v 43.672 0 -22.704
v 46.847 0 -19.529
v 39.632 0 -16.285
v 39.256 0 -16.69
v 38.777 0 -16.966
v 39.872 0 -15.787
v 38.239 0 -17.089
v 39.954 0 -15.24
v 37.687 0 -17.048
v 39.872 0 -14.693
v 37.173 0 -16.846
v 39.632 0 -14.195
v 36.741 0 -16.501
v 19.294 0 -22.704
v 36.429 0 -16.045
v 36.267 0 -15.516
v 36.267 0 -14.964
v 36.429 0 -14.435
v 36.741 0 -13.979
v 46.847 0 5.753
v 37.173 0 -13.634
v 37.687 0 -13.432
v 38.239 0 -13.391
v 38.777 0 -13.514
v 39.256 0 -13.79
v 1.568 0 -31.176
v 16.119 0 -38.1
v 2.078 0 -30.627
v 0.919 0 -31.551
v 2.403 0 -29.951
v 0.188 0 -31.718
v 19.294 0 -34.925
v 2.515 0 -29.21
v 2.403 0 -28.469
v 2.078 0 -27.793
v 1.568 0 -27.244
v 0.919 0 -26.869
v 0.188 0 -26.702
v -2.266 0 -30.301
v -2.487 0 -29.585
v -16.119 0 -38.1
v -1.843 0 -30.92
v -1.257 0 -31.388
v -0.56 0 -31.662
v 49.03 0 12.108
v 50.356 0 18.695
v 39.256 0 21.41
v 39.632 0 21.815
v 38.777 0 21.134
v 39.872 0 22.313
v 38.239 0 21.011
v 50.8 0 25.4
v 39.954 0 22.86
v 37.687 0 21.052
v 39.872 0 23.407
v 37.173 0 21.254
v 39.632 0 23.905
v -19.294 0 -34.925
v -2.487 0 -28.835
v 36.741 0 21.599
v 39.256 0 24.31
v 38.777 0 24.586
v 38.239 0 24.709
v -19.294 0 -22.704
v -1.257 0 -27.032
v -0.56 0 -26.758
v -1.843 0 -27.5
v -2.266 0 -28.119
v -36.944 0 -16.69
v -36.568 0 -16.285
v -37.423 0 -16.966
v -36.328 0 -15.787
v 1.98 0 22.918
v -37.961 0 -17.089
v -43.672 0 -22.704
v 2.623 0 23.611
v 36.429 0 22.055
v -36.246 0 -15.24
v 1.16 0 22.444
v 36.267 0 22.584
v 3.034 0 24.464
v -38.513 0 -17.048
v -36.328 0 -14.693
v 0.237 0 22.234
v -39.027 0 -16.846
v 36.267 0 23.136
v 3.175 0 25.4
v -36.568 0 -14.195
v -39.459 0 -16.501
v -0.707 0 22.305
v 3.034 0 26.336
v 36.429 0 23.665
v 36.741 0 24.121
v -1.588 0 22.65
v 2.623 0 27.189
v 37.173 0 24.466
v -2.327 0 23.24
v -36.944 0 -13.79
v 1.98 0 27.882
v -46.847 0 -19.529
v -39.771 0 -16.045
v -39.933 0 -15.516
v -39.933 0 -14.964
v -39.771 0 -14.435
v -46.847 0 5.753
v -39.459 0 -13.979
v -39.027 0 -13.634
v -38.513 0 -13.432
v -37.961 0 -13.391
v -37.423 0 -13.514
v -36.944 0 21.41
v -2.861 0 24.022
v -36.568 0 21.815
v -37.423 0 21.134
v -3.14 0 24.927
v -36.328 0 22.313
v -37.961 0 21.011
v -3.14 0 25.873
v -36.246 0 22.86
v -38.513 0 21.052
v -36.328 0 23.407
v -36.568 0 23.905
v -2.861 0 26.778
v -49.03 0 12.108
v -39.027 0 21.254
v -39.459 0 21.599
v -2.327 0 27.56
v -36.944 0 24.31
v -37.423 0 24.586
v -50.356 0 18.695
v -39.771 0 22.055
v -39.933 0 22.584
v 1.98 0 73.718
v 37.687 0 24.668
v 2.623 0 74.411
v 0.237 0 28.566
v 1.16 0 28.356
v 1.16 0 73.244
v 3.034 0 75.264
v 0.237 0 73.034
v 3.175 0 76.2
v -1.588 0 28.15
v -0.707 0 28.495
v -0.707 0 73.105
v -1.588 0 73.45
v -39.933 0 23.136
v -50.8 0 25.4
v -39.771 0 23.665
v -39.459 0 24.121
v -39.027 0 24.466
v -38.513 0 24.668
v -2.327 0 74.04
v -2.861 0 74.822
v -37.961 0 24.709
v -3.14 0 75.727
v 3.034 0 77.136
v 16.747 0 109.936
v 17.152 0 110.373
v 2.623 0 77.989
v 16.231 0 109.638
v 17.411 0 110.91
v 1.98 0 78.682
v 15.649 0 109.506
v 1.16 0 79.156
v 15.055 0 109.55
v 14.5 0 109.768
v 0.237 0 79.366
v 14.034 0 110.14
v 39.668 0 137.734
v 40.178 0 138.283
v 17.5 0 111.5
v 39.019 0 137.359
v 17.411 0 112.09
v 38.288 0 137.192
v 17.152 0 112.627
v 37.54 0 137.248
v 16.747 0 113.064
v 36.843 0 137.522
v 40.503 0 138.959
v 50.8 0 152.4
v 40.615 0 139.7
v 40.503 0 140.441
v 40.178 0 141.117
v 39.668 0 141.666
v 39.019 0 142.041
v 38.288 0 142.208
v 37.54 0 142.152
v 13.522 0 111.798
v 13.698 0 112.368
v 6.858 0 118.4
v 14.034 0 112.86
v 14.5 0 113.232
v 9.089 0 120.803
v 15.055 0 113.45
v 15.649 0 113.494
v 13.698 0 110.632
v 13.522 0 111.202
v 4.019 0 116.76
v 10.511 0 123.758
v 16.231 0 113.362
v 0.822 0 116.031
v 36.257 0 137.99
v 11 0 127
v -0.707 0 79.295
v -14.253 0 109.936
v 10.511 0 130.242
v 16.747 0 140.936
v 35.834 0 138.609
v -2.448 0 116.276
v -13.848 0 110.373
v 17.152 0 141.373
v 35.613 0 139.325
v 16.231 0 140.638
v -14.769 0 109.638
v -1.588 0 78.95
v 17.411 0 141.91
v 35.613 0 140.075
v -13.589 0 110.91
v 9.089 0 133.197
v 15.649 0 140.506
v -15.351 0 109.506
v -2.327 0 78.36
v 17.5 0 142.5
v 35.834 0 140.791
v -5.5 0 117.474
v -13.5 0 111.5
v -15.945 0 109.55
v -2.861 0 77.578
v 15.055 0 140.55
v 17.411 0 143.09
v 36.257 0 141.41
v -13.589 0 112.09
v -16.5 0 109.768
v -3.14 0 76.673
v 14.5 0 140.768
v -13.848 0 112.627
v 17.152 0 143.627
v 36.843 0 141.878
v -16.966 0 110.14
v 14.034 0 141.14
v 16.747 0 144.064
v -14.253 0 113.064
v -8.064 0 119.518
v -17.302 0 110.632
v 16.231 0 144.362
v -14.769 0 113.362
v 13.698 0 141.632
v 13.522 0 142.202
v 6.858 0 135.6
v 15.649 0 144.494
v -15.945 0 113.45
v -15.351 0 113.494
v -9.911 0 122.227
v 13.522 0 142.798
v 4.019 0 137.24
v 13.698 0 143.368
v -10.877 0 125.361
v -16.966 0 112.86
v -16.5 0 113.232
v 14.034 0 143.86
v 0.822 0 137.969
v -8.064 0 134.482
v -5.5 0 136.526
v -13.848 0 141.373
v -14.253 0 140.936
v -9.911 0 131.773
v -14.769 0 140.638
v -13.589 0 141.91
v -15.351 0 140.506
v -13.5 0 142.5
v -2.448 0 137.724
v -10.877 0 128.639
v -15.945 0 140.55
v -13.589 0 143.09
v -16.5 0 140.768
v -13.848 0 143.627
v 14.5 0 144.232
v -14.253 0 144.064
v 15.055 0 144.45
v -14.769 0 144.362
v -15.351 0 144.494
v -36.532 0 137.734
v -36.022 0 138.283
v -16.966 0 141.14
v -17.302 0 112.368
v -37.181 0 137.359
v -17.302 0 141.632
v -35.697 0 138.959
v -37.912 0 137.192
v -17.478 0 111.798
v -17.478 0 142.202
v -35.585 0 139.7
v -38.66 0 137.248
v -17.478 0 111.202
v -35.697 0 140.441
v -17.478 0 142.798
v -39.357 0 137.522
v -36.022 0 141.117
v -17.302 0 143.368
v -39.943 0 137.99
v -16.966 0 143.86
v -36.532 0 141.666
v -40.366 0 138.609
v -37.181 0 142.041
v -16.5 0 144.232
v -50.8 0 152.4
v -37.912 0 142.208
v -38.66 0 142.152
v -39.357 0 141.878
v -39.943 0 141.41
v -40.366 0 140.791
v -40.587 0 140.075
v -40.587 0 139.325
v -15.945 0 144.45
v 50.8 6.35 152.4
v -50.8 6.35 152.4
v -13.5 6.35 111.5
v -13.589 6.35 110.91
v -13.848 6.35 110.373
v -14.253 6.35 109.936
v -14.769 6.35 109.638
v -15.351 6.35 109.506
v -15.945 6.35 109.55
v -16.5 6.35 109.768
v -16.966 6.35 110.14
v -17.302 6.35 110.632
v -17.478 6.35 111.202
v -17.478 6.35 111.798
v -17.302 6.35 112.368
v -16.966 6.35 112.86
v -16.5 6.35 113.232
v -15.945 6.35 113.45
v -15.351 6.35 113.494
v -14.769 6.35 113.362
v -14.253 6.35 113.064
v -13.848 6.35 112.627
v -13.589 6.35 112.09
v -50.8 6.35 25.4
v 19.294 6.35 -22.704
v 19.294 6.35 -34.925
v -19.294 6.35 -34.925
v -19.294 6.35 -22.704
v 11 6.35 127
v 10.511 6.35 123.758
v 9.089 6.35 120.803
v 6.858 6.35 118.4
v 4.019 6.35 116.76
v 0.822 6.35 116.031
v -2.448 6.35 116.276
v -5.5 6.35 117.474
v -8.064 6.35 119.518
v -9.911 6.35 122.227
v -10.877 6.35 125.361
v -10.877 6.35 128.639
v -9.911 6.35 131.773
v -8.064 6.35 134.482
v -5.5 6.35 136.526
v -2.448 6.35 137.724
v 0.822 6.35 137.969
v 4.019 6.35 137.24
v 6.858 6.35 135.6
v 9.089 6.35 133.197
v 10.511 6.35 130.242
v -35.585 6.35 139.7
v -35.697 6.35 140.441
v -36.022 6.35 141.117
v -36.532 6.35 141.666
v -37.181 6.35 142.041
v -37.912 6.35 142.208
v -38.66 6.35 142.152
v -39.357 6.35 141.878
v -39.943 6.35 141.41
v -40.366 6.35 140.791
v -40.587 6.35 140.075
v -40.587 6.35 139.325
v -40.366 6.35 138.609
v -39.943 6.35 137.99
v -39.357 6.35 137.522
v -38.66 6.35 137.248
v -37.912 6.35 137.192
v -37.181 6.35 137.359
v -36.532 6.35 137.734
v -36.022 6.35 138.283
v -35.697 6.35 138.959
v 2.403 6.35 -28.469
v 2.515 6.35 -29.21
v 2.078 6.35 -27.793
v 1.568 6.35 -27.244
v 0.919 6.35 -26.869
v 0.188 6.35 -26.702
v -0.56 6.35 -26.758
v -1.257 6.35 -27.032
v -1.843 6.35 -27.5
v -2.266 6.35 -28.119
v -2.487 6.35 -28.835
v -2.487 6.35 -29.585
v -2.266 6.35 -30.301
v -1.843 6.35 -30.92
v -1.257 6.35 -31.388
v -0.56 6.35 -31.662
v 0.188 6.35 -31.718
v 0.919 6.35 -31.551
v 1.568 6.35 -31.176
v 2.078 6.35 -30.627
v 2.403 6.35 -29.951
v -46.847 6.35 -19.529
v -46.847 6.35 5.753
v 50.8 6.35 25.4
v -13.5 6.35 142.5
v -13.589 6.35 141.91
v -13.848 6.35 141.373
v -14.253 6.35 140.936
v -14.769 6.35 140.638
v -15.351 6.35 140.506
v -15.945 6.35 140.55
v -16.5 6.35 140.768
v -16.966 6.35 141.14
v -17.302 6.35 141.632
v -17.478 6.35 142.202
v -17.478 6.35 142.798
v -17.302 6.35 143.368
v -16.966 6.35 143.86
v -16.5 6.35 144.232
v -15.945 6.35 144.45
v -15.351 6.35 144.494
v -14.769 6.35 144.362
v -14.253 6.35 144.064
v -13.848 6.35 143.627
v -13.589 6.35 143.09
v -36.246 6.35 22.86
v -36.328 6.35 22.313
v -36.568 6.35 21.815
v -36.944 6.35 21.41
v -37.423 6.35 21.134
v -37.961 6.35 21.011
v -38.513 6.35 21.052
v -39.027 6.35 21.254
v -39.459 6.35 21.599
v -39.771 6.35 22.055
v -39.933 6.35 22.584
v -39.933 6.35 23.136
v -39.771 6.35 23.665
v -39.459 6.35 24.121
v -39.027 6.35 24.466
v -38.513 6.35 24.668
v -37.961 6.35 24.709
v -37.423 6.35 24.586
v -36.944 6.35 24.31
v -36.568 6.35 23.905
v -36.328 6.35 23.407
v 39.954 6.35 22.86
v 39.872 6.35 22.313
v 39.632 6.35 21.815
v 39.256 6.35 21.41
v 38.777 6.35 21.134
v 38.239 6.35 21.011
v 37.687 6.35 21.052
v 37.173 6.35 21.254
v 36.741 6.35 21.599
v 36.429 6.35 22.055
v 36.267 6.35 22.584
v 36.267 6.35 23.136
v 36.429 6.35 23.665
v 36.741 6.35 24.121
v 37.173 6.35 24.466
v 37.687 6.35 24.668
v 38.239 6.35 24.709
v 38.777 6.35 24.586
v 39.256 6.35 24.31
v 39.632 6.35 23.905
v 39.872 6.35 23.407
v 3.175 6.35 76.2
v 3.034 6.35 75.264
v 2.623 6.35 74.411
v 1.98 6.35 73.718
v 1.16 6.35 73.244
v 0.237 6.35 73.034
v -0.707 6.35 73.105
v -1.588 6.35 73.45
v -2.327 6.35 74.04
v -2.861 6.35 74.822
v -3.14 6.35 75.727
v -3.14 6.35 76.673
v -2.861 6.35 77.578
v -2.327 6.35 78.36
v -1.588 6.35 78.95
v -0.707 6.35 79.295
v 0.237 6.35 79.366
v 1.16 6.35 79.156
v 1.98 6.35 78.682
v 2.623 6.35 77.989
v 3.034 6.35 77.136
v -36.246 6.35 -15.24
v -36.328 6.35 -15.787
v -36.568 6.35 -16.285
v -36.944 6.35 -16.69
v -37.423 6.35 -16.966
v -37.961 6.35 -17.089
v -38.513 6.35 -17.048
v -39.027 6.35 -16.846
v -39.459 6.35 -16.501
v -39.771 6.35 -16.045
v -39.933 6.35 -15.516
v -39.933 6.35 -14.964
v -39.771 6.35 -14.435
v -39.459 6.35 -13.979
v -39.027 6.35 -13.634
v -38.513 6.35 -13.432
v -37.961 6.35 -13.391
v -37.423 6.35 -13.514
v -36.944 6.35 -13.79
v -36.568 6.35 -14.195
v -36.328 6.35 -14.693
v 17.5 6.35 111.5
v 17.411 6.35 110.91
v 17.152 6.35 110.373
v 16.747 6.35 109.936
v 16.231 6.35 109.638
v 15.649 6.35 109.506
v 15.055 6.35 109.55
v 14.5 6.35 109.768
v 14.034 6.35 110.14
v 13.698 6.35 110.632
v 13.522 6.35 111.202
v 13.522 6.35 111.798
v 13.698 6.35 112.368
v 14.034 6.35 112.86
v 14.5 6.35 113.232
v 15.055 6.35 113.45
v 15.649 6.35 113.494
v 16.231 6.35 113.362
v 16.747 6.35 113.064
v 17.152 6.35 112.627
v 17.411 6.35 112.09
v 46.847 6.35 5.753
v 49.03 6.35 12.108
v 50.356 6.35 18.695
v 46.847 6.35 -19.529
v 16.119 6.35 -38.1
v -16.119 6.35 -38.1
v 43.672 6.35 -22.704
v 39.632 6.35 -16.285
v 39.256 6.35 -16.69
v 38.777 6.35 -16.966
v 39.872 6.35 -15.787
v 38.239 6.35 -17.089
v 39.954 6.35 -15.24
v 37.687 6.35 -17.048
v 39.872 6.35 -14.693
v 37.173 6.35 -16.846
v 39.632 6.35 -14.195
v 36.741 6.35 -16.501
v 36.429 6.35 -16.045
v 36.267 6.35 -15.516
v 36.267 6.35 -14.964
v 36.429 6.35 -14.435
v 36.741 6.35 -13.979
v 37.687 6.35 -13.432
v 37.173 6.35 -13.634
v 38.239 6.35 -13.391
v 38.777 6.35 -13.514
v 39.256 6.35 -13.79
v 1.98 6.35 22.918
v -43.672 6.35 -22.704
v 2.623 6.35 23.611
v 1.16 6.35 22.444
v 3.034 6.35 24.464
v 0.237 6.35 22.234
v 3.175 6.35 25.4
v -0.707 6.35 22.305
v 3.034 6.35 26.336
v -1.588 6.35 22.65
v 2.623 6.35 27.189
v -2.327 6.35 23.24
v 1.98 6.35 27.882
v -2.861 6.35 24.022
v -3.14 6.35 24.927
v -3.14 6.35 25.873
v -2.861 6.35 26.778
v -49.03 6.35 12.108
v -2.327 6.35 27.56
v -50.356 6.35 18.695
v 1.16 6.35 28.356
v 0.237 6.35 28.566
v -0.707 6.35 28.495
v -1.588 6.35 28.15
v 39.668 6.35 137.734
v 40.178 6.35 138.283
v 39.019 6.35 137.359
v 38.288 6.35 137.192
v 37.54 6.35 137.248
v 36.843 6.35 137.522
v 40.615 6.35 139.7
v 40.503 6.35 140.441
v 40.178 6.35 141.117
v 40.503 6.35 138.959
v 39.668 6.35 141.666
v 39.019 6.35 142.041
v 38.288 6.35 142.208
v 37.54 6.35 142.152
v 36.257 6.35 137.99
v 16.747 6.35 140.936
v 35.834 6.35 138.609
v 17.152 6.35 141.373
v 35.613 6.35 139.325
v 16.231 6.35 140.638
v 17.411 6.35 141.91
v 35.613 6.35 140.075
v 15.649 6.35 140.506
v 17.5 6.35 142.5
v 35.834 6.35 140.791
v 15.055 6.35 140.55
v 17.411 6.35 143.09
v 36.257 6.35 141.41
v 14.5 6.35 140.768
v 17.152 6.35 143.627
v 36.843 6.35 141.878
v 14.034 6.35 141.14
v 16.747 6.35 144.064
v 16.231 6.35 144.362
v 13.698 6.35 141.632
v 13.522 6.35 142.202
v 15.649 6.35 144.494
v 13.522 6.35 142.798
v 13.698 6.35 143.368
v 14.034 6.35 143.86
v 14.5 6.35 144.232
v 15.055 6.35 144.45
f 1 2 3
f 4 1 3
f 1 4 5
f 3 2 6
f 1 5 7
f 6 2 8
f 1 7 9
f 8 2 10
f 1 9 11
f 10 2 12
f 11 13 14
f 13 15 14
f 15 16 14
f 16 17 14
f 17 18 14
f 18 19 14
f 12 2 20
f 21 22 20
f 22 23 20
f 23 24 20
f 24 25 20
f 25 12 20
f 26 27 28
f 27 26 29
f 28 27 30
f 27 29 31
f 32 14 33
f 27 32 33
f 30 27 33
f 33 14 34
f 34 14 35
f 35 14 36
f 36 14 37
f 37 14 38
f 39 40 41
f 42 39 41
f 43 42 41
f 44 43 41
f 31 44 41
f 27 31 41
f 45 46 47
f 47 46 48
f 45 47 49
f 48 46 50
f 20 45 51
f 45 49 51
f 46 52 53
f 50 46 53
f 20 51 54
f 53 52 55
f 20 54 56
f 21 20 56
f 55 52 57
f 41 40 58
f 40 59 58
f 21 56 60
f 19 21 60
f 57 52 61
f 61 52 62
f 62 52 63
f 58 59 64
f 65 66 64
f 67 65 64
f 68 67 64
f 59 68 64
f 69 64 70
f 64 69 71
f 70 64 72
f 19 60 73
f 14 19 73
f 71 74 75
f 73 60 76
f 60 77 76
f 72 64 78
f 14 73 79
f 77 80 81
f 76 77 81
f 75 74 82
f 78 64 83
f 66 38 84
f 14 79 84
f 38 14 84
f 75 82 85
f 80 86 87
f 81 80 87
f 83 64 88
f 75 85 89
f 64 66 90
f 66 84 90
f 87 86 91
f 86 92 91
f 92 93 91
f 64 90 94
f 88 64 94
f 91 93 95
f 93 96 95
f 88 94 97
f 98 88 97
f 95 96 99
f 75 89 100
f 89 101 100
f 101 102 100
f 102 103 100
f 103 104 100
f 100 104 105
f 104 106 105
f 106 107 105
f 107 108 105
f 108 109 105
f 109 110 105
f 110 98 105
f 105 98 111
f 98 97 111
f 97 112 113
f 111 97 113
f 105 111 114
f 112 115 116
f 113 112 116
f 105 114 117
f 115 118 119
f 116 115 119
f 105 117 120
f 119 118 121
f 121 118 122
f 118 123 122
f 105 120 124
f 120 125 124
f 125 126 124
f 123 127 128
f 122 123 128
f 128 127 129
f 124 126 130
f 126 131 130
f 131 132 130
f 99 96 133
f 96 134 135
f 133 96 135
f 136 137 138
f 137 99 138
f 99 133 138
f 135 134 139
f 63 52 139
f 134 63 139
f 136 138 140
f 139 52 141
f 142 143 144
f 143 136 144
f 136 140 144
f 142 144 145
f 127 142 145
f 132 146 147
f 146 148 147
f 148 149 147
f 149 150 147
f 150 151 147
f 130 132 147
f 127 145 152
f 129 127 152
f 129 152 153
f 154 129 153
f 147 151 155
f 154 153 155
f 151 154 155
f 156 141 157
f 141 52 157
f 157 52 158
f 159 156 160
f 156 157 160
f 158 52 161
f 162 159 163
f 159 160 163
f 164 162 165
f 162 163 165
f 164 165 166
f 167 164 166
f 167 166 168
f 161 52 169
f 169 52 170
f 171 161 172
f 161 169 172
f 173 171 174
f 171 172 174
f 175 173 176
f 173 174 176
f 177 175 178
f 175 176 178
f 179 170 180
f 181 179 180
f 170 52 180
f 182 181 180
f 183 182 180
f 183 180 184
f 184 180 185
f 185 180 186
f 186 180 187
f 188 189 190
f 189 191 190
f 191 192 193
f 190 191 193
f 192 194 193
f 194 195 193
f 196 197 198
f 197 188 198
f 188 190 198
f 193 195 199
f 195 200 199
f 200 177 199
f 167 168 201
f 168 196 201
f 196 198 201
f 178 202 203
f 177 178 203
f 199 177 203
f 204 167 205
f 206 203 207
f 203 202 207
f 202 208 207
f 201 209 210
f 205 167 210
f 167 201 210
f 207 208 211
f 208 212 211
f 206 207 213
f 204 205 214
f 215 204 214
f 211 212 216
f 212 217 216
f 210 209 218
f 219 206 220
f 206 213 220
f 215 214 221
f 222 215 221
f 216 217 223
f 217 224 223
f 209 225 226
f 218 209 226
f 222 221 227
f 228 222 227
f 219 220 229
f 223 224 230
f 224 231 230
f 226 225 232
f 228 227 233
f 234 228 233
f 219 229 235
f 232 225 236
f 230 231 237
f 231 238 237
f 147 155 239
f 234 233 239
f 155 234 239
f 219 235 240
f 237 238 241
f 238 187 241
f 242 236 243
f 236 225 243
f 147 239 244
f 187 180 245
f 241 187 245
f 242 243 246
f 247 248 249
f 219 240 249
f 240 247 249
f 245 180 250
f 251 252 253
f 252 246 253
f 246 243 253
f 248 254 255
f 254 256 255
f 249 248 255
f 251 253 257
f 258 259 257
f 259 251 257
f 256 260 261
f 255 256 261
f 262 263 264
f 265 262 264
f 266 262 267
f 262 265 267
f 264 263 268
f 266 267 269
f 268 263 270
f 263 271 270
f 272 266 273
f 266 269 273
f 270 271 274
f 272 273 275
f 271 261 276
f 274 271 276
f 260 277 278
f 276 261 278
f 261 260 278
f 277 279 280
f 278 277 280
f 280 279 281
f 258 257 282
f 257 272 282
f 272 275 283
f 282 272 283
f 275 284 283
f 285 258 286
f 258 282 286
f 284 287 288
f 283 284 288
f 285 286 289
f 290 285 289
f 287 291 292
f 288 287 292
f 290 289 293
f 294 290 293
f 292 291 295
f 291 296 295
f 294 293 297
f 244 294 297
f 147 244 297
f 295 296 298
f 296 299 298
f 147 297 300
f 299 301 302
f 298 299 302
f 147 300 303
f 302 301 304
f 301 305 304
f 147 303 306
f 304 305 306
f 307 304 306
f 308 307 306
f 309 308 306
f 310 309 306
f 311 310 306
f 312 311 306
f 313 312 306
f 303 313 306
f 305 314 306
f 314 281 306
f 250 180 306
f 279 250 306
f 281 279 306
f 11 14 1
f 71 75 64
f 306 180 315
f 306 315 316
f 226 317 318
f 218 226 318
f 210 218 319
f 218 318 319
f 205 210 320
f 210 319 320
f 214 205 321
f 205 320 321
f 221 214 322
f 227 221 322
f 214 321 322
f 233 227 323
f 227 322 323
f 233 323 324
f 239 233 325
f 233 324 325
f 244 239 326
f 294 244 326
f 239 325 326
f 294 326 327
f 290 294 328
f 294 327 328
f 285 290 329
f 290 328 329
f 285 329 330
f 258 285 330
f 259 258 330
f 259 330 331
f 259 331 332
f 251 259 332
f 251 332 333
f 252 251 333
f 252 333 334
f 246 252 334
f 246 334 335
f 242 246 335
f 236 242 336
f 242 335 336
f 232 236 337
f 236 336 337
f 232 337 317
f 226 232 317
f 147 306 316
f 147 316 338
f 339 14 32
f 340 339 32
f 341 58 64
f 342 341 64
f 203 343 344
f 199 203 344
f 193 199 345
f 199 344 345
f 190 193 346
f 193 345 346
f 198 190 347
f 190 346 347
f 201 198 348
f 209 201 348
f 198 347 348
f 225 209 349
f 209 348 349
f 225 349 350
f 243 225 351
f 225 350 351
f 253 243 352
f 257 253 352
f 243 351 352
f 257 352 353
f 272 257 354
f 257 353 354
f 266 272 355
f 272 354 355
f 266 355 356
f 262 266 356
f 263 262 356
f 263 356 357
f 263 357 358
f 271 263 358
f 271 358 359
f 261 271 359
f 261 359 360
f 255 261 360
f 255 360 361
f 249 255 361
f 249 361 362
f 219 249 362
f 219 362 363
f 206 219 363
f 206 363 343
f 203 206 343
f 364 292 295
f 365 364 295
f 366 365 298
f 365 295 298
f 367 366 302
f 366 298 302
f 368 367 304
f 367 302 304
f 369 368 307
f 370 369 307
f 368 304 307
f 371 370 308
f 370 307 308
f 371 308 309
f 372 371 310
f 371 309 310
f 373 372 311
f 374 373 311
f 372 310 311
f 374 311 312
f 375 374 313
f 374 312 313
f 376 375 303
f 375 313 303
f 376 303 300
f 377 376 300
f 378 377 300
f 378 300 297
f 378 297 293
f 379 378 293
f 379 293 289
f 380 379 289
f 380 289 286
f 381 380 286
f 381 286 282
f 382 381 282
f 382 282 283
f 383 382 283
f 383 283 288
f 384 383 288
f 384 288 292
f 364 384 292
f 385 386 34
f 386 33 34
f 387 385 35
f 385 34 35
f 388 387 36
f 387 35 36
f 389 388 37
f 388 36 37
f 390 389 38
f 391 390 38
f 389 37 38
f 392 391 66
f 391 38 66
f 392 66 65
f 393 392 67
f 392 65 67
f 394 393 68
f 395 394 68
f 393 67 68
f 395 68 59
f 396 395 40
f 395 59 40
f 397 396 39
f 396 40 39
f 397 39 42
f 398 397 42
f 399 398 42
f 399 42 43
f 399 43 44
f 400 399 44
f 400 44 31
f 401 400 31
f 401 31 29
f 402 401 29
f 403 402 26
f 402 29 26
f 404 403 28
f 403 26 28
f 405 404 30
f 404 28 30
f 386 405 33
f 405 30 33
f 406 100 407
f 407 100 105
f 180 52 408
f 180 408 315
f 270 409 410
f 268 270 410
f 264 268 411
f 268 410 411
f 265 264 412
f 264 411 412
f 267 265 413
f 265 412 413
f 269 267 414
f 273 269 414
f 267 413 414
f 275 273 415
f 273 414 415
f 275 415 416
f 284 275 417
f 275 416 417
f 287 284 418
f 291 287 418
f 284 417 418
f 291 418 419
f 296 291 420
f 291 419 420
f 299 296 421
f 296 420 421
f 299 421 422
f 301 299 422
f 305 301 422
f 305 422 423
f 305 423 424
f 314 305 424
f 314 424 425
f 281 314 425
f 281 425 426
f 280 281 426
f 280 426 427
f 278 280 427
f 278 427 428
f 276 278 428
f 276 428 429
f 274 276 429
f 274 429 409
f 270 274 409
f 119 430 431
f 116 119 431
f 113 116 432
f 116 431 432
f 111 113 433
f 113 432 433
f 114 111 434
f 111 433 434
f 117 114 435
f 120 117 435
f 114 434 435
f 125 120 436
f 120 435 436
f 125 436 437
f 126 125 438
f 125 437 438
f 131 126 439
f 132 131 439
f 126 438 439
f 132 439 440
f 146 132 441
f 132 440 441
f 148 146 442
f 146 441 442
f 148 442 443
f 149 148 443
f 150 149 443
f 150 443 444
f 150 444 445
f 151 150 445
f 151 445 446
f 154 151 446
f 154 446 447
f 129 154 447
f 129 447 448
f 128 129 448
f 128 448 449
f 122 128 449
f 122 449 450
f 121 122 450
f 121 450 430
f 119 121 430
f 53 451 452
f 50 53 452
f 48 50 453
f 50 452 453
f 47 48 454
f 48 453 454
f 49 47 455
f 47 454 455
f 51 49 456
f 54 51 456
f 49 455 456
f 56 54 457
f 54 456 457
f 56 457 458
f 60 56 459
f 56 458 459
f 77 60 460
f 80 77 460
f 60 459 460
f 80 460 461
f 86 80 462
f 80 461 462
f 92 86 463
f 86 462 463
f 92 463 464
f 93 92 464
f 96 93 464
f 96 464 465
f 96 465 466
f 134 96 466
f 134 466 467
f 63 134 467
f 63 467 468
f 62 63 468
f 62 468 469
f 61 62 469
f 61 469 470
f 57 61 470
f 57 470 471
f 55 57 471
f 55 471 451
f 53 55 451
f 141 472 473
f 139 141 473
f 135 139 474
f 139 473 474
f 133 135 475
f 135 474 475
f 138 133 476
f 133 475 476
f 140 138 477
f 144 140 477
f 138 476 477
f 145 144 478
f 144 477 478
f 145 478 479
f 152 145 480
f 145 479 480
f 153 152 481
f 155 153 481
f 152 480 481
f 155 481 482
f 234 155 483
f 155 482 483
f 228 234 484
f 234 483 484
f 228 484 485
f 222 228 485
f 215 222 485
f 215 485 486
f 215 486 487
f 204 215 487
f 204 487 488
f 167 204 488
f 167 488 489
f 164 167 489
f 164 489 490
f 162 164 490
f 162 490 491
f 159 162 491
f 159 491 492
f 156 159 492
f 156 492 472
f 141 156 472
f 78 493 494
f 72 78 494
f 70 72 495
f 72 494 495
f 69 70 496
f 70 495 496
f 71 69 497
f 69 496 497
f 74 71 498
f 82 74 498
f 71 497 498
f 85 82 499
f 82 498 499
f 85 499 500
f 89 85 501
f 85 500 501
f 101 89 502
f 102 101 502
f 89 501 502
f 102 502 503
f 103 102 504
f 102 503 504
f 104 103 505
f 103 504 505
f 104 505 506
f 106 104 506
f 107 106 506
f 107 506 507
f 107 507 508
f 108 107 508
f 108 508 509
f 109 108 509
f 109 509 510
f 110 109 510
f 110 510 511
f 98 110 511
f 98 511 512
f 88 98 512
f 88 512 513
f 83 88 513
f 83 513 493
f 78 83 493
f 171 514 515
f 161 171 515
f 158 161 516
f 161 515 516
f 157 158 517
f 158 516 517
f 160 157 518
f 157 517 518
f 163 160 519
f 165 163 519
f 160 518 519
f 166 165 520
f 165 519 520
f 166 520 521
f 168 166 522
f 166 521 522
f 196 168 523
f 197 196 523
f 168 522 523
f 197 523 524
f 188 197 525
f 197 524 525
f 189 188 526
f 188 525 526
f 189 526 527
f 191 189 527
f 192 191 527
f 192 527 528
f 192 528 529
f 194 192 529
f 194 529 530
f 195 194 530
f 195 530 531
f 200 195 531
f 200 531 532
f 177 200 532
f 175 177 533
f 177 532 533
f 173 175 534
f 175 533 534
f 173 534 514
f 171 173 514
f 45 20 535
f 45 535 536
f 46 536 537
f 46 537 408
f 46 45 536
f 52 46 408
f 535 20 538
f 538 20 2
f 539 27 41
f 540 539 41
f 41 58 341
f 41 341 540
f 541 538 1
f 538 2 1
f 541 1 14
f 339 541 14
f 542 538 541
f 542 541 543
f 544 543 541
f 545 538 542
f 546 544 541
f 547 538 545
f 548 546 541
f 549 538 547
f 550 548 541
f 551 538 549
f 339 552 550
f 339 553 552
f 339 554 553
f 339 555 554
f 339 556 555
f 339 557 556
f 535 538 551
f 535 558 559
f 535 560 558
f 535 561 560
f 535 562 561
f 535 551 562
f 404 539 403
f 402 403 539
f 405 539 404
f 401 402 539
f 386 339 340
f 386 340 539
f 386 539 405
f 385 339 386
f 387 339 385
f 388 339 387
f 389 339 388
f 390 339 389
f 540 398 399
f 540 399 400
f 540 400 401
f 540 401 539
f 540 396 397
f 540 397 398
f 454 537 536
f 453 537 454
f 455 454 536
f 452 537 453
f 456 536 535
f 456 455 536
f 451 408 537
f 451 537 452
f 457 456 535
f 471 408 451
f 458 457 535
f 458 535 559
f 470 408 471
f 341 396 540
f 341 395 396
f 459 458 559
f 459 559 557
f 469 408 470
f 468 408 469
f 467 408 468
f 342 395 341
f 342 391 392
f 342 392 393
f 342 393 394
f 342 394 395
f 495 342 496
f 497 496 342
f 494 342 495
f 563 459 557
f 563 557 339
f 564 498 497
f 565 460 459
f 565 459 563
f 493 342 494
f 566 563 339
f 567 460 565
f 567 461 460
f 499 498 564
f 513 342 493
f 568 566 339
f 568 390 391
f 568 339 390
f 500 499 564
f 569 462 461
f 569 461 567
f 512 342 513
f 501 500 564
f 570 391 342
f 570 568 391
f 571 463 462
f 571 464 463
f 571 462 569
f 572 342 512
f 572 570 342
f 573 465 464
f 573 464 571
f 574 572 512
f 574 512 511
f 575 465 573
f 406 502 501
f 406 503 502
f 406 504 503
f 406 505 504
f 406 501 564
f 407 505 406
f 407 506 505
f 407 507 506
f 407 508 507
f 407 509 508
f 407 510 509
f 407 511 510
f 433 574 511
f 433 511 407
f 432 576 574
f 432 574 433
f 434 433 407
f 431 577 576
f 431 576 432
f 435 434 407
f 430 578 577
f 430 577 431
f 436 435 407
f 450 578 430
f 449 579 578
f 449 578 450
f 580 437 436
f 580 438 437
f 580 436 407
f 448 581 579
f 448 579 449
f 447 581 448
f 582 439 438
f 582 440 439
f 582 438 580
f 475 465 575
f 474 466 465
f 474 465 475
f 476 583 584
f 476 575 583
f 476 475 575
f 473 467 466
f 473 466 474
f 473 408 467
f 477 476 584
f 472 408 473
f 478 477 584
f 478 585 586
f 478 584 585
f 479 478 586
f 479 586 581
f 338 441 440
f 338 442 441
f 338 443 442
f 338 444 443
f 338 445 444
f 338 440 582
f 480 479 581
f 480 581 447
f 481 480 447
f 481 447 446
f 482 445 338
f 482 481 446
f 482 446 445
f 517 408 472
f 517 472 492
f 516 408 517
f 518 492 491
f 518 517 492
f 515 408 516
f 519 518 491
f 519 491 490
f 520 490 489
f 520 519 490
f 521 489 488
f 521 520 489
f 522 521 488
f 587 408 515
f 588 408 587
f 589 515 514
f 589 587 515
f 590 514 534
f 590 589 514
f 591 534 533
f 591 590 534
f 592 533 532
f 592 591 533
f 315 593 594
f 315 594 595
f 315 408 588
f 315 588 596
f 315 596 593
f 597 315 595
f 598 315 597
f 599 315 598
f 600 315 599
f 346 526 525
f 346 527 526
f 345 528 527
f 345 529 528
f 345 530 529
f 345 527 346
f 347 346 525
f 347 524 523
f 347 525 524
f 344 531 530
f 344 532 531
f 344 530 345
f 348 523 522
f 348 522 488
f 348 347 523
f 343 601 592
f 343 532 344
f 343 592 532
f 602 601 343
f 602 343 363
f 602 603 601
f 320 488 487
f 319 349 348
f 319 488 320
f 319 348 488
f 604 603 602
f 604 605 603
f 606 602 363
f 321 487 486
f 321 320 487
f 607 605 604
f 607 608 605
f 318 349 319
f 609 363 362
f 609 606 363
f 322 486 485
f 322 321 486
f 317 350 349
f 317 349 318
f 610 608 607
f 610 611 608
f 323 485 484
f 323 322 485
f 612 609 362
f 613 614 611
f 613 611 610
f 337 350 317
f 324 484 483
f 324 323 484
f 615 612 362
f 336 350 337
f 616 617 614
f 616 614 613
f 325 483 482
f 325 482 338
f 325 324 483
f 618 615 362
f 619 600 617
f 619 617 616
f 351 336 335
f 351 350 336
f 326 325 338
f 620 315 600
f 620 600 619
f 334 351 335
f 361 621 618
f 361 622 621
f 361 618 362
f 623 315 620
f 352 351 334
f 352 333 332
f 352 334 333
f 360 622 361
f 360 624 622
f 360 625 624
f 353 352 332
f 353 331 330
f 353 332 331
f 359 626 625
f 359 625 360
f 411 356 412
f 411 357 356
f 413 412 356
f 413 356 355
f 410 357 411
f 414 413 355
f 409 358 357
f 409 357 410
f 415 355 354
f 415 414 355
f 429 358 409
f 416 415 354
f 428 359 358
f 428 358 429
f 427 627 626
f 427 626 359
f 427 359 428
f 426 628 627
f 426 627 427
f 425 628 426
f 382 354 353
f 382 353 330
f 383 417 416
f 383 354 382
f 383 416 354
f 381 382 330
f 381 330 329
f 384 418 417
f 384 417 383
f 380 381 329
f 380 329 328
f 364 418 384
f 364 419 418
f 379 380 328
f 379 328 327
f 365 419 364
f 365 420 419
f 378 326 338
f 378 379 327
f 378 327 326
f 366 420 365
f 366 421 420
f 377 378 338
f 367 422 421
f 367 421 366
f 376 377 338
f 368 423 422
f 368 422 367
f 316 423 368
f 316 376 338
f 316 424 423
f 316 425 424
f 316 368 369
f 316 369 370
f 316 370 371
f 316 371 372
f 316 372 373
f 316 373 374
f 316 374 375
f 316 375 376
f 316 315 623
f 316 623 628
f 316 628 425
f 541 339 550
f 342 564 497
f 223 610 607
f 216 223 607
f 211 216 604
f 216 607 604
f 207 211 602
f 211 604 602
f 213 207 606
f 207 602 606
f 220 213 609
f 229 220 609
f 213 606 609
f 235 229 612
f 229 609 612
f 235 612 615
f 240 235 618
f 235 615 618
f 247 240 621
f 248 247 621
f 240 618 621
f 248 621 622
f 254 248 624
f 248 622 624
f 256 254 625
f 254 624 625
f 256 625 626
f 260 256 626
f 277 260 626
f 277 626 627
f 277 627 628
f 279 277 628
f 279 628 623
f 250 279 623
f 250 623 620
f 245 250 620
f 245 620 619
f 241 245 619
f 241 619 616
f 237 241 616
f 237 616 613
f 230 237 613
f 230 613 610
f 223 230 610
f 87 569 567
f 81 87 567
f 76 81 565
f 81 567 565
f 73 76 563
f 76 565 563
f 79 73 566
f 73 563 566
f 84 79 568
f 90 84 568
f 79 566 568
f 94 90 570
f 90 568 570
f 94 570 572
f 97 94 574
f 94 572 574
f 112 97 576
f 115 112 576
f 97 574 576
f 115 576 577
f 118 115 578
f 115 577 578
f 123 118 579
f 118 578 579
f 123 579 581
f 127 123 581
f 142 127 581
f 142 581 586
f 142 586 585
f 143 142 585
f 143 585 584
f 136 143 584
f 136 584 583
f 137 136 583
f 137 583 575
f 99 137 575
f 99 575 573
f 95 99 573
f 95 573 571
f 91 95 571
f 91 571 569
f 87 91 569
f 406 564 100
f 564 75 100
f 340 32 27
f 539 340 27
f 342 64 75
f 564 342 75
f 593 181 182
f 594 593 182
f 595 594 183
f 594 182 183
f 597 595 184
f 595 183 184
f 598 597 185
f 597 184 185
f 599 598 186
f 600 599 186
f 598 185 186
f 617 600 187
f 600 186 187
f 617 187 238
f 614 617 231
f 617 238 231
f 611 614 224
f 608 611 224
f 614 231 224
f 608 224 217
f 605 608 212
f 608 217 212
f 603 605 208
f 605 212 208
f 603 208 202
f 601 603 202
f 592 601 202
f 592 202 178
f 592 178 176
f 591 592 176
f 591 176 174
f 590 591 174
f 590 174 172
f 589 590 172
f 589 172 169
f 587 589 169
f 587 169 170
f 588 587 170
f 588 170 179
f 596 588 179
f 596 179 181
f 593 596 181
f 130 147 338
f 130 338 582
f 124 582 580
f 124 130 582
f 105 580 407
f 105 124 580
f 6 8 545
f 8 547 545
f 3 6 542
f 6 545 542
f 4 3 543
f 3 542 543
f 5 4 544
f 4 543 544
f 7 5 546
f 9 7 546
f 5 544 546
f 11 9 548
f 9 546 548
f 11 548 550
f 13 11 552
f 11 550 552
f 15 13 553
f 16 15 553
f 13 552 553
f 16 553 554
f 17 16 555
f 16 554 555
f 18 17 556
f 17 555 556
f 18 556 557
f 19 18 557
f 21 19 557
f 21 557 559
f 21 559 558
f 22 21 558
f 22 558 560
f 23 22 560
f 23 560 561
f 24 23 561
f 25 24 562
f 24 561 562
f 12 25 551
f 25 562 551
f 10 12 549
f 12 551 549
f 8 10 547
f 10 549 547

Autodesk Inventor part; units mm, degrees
ref_plane "YZ Plane" through (0, 0, 0) normal (1, 0, 0) x (0, 1, 0)
ref_plane "XZ Plane" through (0, 0, 0) normal (0, 1, 0) x (-1, 0, 0)
ref_plane "XY Plane" through (0, 0, 0) normal (0, 0, 1) x (1, 0, 0)
sketch "Sketch1" plane through (0, 0, 0) normal (0, 1, 0) x (-1, 0, 0)
  line L0 (50.8, -50.8) -> (-50.8, -50.8)
  line L1 (-50.8, -50.8) -> (-50.8, 152.4)
  line L2 (-50.8, 152.4) -> (50.8, 152.4)
  line L3 (50.8, 152.4) -> (50.8, -50.8)
  point P0 (0, 0)
  dimension "d0" = 101.6
  dimension "d1" = 203.2
extrude "Extrusion1" add sketch "Sketch1" along normal blind 6.35
sketch "Sketch2" plane through (0, 6.35, 0) normal (0, 1, 0) x (1, 0, 0)
  line L0 (-50.8, -152.4) -> (50.8, -152.4) projected
  line L1 (25.4, 0) -> (25.4, -152.4) construction
  circle A0 centre (0, -127) radius 11
  circle A1 centre (0, -76.2) radius 3.175
  circle A2 centre (0, -25.4) radius 3.175
  circle A3 centre (0, -127) radius 11 projected
  line L2 (50.8, -152.4) -> (50.8, 50.8) projected
  dimension "d4" = 22
  dimension "d5" = 6.35
  dimension "d6" = 50.8
  dimension "d7" = 25.4
  dimension "d10" = 6.35
  dimension "d11" = 50.8
  dimension "d12" = 22
  dimension "d13" = 50.8
  dimension "d14" = 50.8
  dimension "d15" = 50.8
extrude "Extrusion2" cut sketch "Sketch2" against normal through all
sketch "Sketch3" plane through (0, 6.35, 0) normal (0, 1, 0) x (1, 0, 0)
  circle A0 centre (15.5, -111.5) radius 2 projected
  circle A1 centre (15.5, -142.5) radius 2 projected
  circle A2 centre (-15.5, -142.5) radius 2 projected
  circle A3 centre (-15.5, -111.5) radius 2 projected
  point P0 (0, 0)
extrude "Extrusion3" cut sketch "Sketch3" against normal through all
sketch "Sketch4" plane through (0, 0, 0) normal (0, -1, 0) x (1, 0, 0)
  line L0 (50.8, 152.4) -> (-50.8, 152.4) projected
  line L1 (-50.8, 152.4) -> (-50.8, -50.8) projected
  circle A0 centre (-38.1, 139.7) radius 2.5146
  circle A1 centre (38.1, 139.7) radius 2.5146
  circle A2 centre (-38.1, -38.1) radius 2.5146
  circle A3 centre (38.1, -38.1) radius 2.5146
  point P0 (0, 0)
  dimension "d18" = 5.0292
  dimension "d19" = 12.7
  dimension "d20" = 12.7
  dimension "d23" = 76.2
  dimension "d26" = 177.8
extrude "Extrusion4" cut sketch "Sketch4" against normal through all
sketch "Sketch5" plane through (0, 6.35, 0) normal (0, 1, 0) x (1, 0, 0)
  circle A0 centre (-38.1, 15.24) radius 1.8542 projected
  circle A1 centre (-38.1, -22.86) radius 1.8542 projected
  circle A2 centre (38.1, 15.24) radius 1.8542 projected
  circle A3 centre (38.1, -22.86) radius 1.8542 projected
  point P0 (0, 0)
extrude "Extrusion5" cut sketch "Sketch5" against normal through all
sketch "Sketch7" plane through (0, 0, 0) normal (0, -1, 0) x (1, 0, 0)
  circle A0 centre (-38.1, -38.1) radius 2.5146 projected
  circle A1 centre (38.1, -38.1) radius 2.5146 projected
  circle A2 centre (0, 76.2) radius 3.175 projected
  circle A3 centre (0, 25.4) radius 3.175 projected
  line L0 (-50.8, -50.8) -> (50.8, -50.8) projected
  line L1 (50.8, -50.8) -> (50.8, 152.4) projected
  line L2 (-50.8, 152.4) -> (-50.8, -50.8) projected
  line L3 (-46.8468, -19.5288) -> (-46.8468, 5.7528)
  line L4 (46.8468, 5.7528) -> (46.8468, -19.5288)
  line L5 (16.1193, -38.1) -> (-16.1193, -38.1)
  line L6 (-19.2943, -34.925) -> (-19.2943, -22.7038)
  line L7 (19.2943, -22.7038) -> (19.2943, -34.925)
  line L8 (43.6718, -22.7038) -> (19.2943, -22.7038)
  line L9 (-19.2943, -22.7038) -> (-43.6718, -22.7038)
  line L10 (19.2943, -34.925) -> (16.1193, -38.1)
  line L11 (-19.2943, -34.925) -> (-16.1193, -38.1)
  line L12 (-43.6718, -22.7038) -> (-46.8468, -19.5288)
  line L13 (46.8468, -19.5288) -> (43.6718, -22.7038)
  arc A4 (-50.8, 25.4) -> (-46.8468, 5.7528) centre (0, 25.4) ccw
  arc A5 (46.8468, 5.7528) -> (50.8, 25.4) centre (0, 25.4) ccw
  arc A6 (3.1734, 76.1008) -> (-3.1734, 76.1008) centre (0, 25.4) ccw
  point P0 (0, 0)
  point P1 (46.8468, -22.7038)
  point P2 (-46.8468, -22.7038)
  point P3 (19.2943, -38.1)
  point P4 (-19.2943, -38.1)
  dimension "d41" = 19.2943
  dimension "d43" = 19.2943
  dimension "d44" = 3.175
  dimension "d45" = 3.175
  dimension "d46" = 3.175
  dimension "d47" = 3.175
  dimension "d48" = 3.175
  dimension "d49" = 3.175
  dimension "d50" = 3.175
  dimension "d51" = 3.175
extrude "Extrusion6" cut sketch "Sketch7" against normal through all contours L2 A4 L3 L12 L9 L6 L11 L5 L10 L7 L8 L13 L4 A5 L1 L0
sketch "Sketch8" plane through (0, 0, 0) normal (0, -1, 0) x (1, 0, 0)
  line L0 (-19.2943, -22.7038) -> (-19.2943, -34.925) projected
  line L1 (-16.1193, -38.1) -> (16.1193, -38.1) projected
  line L2 (19.2943, -34.925) -> (19.2943, -22.7038) projected
  circle A0 centre (0, -29.21) radius 2.5146
  point P0 (0, 0)
  dimension "d54" = 5.0292
  dimension "d55" = 8.89
  dimension "d56" = 19.2943
  dimension "d57" = 19.2943
extrude "Extrusion7" cut sketch "Sketch8" against normal through all
equation "\"d4\" = d12"
equation "\"d14\" = d13"
equation "\"d15\" = d13"
equation "\"d43\" = d41"
equation "\"d45\" = d44"
equation "\"d46\" = d44"
equation "\"d47\" = d46"
equation "\"d48\" = d44"
equation "\"d49\" = d48"
equation "\"d50\" = d44"
equation "\"d51\" = d50"
equation "\"d56\" = d57"
properties part number "gearBoxBase" material "Polycarbonate, Smoke"
